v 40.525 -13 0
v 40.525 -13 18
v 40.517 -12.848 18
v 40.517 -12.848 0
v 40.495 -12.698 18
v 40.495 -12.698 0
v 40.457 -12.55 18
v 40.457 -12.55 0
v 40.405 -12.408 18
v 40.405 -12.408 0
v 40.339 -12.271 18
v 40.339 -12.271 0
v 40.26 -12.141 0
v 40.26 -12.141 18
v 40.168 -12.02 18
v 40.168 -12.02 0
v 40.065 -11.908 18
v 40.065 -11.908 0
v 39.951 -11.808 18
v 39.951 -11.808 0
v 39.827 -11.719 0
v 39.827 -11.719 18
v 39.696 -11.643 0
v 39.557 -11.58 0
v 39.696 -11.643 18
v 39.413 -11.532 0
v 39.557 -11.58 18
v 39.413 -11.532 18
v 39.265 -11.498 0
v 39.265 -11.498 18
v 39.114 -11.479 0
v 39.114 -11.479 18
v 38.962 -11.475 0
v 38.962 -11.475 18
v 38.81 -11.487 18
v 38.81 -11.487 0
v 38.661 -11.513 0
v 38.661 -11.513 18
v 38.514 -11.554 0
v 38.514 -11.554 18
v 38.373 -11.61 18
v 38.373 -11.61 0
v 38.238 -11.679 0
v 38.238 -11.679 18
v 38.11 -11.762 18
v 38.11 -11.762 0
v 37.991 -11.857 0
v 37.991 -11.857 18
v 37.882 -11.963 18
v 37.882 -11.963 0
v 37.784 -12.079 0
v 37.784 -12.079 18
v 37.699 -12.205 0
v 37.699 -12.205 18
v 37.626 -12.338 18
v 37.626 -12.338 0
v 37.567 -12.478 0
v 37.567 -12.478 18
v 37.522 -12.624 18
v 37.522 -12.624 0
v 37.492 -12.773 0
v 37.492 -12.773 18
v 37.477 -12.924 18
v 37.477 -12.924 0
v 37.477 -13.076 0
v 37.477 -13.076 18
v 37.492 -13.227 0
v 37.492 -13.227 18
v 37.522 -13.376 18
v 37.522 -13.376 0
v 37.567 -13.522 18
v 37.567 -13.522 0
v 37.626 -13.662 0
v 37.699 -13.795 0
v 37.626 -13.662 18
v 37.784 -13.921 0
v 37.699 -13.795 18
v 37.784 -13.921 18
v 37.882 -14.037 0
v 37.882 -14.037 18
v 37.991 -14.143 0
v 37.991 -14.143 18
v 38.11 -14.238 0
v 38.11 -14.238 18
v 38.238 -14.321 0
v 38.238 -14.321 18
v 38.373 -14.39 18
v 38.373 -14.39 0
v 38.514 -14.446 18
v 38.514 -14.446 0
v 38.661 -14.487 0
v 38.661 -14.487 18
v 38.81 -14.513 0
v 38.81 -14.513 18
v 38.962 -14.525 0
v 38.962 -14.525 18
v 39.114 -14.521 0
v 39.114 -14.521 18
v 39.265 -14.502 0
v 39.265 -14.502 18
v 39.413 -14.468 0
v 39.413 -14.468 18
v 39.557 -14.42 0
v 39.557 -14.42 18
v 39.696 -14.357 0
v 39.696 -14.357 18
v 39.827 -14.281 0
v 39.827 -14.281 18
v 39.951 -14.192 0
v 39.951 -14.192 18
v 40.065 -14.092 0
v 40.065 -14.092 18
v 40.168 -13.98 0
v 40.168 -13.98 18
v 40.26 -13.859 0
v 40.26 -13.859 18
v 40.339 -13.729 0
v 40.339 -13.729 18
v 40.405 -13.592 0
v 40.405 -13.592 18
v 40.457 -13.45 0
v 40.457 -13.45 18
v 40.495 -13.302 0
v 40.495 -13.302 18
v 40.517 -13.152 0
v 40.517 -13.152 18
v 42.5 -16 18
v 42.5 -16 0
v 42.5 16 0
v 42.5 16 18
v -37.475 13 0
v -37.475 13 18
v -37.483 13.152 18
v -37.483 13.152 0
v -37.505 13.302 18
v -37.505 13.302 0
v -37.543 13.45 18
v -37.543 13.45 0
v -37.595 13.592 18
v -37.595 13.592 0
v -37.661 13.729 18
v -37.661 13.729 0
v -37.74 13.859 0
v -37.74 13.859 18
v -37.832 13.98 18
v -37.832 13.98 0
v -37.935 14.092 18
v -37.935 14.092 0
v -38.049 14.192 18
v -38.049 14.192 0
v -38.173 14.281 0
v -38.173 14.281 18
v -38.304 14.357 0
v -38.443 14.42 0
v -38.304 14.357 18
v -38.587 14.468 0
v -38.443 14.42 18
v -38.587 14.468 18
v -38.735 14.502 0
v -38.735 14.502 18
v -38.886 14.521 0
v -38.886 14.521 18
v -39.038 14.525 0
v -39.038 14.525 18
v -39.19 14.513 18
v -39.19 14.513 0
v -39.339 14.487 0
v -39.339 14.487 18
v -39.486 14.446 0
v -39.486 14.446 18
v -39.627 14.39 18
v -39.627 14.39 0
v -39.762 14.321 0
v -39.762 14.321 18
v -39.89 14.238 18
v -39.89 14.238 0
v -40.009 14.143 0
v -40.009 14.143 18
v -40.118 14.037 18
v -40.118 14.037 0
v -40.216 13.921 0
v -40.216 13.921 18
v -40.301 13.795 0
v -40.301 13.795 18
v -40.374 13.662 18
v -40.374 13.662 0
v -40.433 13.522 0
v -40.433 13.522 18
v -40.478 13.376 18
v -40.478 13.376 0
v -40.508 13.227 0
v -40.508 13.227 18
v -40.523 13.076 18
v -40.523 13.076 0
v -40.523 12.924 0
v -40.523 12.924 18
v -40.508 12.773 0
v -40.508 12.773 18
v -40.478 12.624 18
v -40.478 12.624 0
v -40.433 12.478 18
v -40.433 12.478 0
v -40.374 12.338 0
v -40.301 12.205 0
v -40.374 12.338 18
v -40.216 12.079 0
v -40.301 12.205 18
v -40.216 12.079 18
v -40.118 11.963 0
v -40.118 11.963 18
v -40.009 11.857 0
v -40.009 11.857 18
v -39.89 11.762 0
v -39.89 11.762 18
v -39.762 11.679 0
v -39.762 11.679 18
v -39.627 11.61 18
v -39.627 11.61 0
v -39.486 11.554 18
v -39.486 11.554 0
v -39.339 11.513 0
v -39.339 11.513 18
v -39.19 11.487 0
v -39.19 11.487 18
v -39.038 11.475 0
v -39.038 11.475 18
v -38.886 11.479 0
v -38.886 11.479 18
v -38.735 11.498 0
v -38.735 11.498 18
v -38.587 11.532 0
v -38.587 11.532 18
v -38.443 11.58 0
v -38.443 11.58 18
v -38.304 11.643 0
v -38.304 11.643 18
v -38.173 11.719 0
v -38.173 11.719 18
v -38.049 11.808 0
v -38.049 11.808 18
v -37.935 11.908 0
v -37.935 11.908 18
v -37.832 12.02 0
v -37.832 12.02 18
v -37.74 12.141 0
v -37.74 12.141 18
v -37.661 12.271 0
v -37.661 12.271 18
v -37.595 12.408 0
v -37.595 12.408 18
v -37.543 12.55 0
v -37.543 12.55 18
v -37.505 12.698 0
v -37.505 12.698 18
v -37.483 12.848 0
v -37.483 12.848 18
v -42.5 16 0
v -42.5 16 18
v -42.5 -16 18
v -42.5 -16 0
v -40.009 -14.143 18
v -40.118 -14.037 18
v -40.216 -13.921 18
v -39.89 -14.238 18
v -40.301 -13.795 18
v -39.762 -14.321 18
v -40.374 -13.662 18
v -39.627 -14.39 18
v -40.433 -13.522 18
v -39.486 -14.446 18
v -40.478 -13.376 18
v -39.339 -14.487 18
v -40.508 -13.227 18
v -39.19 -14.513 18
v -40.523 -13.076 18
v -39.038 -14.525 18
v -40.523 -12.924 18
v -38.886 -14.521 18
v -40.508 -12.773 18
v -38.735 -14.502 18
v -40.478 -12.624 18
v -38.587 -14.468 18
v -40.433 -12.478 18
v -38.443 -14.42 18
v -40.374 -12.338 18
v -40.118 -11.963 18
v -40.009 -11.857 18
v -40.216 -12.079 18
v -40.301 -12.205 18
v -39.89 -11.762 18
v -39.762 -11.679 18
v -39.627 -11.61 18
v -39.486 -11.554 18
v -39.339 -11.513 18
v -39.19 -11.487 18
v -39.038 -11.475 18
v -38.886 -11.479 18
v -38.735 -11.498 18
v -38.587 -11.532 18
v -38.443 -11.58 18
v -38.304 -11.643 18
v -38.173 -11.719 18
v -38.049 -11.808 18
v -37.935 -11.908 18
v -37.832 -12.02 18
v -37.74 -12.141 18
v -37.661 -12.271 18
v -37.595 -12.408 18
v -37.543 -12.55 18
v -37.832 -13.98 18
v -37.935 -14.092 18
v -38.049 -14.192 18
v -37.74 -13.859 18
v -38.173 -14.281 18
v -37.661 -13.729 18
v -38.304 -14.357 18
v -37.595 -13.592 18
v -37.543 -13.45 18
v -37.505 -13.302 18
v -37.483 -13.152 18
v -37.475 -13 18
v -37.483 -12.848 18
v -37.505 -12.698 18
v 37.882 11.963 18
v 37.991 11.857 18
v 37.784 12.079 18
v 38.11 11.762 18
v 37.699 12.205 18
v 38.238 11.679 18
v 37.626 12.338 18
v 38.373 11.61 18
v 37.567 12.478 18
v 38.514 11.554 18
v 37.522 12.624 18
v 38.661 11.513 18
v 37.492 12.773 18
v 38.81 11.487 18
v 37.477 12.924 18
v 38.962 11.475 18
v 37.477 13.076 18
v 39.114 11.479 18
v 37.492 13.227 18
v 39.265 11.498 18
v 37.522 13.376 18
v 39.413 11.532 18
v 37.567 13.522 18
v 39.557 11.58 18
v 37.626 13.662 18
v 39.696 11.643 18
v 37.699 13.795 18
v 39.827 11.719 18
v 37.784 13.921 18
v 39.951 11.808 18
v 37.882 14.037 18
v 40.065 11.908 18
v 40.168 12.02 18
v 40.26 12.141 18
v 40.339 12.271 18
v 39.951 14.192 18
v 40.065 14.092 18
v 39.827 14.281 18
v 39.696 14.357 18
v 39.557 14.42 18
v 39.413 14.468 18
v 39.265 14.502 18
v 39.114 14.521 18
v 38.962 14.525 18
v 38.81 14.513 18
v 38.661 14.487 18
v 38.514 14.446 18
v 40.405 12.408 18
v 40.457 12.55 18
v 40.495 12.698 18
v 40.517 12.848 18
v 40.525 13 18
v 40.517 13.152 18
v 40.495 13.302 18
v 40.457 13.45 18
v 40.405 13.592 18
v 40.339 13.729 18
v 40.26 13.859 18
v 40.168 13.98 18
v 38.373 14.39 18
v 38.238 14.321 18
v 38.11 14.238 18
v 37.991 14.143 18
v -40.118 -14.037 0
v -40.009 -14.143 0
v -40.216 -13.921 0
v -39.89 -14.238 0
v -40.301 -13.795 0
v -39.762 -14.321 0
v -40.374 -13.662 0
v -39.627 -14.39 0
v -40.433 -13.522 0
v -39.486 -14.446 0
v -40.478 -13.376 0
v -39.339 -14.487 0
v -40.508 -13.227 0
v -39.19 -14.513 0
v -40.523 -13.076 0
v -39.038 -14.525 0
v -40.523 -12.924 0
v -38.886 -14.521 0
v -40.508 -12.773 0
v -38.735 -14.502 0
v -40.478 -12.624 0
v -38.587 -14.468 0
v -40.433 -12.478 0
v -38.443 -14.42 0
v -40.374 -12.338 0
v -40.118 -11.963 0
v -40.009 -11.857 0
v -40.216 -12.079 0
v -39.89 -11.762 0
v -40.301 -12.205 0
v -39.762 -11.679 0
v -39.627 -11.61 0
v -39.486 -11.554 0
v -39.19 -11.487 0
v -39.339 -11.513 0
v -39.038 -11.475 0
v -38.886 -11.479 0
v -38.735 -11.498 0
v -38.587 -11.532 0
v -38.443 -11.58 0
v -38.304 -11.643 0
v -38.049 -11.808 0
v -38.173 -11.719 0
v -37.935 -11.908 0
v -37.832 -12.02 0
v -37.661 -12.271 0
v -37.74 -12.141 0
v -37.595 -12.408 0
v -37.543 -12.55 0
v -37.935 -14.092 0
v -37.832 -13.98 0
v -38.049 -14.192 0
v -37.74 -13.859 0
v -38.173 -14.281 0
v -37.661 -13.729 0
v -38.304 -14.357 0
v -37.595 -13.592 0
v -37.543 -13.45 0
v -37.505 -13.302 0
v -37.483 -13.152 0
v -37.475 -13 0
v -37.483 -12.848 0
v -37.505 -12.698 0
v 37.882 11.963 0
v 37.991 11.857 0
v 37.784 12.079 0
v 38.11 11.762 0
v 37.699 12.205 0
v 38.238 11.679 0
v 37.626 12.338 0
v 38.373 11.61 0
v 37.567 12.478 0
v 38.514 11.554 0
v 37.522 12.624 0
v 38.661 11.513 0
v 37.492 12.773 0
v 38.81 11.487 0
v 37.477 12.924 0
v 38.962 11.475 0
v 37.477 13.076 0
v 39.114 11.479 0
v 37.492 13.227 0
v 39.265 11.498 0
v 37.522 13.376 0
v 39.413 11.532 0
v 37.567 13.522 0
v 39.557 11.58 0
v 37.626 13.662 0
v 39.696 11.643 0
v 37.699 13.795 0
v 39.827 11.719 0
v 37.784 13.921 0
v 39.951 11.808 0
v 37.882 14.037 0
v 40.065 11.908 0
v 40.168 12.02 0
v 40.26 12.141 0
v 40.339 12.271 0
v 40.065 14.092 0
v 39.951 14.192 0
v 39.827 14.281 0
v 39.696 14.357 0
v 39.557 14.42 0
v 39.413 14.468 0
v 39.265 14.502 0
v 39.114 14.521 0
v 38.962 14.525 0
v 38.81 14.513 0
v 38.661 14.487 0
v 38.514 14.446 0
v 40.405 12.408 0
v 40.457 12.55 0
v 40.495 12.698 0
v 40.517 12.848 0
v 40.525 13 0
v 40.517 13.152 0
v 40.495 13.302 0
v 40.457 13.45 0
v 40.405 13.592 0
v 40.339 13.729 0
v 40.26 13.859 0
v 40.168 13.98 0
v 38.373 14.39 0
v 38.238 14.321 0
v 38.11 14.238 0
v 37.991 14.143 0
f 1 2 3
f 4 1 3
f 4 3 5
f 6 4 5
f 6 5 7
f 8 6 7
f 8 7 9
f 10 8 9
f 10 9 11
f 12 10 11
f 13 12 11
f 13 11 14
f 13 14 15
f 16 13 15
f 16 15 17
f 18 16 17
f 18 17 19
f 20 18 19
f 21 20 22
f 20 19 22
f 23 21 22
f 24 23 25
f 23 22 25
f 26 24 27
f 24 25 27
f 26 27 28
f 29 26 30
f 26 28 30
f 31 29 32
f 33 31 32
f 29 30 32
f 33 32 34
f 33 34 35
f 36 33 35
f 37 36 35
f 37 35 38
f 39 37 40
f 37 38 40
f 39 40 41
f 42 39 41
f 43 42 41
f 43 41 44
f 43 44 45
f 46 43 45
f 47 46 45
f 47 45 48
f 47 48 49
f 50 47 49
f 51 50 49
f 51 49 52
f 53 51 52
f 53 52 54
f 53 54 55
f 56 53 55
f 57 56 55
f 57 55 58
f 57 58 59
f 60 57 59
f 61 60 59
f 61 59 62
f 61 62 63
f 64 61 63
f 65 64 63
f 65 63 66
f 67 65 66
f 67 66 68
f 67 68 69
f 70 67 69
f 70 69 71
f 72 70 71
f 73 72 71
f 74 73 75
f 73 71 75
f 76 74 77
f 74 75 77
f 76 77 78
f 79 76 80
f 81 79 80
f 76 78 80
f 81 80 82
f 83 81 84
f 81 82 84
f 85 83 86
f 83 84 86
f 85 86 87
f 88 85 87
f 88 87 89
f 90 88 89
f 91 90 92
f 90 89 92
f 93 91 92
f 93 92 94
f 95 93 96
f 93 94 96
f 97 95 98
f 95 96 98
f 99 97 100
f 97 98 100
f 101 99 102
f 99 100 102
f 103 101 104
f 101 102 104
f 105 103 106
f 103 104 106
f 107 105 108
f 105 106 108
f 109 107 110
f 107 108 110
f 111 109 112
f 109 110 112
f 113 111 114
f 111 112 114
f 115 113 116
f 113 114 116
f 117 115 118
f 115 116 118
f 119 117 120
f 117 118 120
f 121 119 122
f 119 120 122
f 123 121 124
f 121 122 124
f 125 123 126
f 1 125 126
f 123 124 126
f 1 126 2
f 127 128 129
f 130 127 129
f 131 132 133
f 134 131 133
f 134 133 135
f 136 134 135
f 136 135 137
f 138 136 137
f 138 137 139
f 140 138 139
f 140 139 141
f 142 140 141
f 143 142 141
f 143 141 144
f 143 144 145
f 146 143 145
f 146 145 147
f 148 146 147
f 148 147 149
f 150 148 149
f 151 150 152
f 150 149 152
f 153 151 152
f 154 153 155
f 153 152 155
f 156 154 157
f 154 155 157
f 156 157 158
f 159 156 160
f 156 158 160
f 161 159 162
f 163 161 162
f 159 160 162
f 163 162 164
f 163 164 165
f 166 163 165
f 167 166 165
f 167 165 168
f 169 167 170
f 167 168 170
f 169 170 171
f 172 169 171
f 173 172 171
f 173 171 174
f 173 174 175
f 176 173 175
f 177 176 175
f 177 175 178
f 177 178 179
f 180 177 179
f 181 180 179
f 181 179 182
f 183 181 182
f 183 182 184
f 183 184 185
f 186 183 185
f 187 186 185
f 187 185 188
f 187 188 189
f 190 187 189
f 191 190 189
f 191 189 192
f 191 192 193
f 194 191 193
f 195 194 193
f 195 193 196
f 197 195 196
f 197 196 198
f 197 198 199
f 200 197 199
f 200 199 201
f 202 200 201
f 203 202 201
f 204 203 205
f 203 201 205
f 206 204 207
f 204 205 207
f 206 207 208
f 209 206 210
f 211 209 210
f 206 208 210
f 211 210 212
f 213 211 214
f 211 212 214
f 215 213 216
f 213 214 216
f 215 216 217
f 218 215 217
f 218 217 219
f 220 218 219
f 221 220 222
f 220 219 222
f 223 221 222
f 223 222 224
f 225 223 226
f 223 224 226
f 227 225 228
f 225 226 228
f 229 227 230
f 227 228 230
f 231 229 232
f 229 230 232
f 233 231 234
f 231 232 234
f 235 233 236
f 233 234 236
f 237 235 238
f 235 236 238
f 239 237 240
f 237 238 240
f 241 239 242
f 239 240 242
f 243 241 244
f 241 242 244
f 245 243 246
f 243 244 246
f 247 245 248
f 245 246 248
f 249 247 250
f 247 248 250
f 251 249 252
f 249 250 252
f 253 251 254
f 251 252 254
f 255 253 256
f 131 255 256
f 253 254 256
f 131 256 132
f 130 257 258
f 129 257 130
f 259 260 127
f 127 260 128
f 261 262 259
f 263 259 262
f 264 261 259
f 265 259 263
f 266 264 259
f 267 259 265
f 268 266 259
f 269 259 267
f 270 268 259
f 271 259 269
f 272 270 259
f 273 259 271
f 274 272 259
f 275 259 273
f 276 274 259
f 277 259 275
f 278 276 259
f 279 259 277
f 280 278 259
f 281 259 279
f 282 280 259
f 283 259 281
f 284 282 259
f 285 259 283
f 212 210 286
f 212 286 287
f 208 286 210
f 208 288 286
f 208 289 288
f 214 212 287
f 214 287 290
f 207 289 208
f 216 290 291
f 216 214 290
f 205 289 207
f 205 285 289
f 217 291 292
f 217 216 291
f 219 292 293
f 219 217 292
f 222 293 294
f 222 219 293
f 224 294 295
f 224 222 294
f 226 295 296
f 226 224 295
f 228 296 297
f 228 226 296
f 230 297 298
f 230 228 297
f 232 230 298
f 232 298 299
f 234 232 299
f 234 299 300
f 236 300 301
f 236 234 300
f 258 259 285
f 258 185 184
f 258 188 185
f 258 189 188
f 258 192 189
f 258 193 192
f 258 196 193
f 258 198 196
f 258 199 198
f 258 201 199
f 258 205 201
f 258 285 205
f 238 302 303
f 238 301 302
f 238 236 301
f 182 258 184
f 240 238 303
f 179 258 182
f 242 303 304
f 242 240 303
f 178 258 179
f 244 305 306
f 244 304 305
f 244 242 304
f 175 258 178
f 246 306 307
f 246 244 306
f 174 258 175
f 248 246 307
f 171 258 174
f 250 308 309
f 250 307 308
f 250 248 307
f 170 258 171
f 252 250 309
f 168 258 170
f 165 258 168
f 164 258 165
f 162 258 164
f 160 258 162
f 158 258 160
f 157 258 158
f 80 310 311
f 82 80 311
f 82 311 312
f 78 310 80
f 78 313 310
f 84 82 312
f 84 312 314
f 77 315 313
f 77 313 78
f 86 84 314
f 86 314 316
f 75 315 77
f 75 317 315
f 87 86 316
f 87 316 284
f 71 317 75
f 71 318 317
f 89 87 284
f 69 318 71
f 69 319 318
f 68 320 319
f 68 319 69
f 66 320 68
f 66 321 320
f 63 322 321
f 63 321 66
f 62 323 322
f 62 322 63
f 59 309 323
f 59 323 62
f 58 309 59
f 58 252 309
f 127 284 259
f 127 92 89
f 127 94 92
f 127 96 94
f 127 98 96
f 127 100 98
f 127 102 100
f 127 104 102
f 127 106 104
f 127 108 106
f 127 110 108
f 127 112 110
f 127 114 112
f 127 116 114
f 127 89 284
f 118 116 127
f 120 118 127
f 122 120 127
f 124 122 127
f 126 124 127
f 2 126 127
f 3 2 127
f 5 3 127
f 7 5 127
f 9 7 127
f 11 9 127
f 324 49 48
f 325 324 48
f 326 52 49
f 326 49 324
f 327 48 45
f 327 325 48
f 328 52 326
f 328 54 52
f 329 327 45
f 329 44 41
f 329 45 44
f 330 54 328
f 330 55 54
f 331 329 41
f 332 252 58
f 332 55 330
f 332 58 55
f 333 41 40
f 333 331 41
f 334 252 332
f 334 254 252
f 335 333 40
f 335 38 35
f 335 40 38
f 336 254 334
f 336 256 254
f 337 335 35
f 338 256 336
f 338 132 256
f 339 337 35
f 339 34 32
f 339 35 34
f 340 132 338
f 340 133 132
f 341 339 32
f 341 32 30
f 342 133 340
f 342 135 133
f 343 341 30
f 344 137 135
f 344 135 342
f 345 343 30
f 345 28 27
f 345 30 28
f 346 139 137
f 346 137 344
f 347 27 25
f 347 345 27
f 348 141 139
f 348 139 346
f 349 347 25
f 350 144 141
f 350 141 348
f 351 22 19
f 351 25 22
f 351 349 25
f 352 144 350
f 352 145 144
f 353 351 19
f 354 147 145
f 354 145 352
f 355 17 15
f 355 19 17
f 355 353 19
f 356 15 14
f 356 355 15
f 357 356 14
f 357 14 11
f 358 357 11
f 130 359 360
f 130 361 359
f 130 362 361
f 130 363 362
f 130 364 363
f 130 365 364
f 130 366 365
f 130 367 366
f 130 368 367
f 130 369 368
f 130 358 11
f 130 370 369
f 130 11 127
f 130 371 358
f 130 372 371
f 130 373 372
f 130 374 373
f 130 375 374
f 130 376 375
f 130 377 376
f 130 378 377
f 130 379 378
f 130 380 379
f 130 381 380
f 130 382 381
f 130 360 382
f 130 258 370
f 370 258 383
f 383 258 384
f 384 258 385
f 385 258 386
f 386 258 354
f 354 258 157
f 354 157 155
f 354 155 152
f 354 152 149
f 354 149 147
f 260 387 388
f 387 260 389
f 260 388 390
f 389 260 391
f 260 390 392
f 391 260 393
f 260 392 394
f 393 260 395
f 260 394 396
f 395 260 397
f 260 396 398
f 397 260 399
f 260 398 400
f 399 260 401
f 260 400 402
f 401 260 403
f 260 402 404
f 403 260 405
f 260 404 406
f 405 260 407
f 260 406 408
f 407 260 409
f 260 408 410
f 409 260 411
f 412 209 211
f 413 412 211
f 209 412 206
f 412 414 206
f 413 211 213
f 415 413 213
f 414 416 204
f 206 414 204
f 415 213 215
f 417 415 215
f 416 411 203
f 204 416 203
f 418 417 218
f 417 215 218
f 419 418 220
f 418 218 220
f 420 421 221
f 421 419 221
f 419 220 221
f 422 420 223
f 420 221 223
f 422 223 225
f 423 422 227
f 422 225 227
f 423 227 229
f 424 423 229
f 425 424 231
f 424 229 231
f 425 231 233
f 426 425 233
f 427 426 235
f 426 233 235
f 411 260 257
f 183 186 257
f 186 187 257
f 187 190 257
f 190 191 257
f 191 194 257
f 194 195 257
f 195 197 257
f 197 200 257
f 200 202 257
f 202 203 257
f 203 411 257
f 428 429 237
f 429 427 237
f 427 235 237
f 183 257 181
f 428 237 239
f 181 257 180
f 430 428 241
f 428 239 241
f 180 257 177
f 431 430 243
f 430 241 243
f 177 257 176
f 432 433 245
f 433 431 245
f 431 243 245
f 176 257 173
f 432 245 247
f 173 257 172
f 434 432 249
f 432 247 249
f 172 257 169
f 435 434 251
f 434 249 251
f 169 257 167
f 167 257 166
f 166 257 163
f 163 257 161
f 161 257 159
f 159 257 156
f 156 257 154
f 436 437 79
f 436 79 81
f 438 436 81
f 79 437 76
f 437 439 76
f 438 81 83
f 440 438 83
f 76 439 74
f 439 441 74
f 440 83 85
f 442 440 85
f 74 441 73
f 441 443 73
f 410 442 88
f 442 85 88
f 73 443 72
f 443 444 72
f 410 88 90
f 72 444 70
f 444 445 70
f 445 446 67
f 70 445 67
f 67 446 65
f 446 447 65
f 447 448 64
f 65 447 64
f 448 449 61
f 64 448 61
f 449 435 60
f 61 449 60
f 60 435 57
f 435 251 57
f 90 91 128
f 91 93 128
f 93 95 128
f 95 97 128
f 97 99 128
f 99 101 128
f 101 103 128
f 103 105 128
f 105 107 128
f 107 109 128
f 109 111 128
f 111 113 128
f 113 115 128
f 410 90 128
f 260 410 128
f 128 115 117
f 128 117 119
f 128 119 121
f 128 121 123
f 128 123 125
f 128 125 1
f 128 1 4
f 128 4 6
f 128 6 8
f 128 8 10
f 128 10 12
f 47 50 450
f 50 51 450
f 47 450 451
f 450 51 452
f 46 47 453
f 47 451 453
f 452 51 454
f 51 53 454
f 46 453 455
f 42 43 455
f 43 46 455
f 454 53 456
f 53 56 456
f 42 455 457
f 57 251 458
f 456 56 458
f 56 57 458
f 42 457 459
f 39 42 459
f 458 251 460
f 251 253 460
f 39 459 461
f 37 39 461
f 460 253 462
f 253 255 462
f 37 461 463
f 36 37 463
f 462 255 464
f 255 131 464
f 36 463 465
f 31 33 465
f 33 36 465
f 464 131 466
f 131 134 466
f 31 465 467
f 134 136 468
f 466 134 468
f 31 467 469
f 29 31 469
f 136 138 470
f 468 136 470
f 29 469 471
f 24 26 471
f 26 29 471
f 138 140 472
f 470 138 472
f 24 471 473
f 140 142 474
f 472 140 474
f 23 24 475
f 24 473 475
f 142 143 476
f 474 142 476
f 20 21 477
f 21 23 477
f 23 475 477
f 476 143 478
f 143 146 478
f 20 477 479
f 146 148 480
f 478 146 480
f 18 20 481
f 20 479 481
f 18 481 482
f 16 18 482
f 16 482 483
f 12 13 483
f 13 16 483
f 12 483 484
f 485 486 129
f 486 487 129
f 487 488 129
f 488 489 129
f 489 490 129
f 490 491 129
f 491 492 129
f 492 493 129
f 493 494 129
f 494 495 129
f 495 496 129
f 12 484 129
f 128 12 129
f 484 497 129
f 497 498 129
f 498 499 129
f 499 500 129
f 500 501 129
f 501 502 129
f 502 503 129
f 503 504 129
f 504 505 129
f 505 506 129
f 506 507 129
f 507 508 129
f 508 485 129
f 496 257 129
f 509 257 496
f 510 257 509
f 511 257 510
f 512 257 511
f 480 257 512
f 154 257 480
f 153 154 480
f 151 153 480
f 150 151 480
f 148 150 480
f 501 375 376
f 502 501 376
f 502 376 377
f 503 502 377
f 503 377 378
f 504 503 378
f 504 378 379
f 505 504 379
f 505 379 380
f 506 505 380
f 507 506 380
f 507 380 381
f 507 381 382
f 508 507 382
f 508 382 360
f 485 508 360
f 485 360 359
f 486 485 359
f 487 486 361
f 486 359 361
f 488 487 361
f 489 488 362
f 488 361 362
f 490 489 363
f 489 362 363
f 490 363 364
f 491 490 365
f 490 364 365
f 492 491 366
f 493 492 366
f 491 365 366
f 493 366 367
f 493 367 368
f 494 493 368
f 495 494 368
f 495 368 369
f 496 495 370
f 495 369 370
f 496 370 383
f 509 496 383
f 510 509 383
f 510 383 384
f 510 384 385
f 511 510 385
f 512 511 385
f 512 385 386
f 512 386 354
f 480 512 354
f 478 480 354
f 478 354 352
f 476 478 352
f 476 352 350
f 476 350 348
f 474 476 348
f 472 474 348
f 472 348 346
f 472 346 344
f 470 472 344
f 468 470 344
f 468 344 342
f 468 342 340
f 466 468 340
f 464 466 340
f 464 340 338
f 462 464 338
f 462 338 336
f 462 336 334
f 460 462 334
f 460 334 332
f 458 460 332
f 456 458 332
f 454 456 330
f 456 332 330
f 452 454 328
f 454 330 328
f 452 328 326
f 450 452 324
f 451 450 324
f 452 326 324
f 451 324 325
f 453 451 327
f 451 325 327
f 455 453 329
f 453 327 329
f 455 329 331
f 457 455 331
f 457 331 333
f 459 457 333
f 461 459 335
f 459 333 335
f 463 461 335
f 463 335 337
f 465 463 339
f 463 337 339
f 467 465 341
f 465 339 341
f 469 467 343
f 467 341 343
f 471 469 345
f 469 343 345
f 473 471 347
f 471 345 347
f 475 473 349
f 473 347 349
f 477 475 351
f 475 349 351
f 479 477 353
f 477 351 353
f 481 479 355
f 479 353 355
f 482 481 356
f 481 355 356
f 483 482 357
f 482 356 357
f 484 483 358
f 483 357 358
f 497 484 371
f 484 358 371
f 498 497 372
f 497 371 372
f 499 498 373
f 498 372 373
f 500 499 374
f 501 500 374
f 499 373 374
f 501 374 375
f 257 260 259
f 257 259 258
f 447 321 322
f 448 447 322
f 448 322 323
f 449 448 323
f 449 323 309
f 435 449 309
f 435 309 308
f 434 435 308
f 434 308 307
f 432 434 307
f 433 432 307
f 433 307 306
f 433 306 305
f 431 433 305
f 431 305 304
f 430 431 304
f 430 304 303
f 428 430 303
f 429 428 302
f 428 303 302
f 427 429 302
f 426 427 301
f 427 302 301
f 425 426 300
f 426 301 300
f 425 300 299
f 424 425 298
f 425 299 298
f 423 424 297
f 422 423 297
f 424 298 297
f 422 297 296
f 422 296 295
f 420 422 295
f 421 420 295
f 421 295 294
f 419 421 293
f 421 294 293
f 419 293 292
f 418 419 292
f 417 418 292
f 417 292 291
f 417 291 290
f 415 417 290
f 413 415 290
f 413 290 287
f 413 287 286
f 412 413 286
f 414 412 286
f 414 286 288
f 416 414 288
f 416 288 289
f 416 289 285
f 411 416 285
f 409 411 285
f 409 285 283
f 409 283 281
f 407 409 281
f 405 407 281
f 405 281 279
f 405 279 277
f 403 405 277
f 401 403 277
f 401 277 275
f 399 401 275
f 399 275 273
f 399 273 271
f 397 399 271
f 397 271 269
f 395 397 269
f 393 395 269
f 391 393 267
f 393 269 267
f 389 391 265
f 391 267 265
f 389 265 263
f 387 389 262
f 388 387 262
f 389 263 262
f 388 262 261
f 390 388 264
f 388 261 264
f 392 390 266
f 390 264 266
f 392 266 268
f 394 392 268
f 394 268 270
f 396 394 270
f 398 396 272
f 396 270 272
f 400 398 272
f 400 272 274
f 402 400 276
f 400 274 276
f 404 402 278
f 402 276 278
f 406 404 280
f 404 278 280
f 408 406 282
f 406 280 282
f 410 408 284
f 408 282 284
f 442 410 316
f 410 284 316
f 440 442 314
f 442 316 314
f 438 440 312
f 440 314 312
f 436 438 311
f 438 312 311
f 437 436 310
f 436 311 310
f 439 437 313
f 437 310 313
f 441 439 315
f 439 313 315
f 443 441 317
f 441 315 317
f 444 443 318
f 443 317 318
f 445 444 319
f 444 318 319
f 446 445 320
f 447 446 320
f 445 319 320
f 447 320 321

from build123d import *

# Parameters (mm, degrees)
SKETCH_1_W               = 85
SKETCH_1_H               = 32
EXTRUDE_1_DEPTH          = 18
SKETCH_2_R               = 1.525
CUT_EXTRUDE_1_DEPTH      = 1
CUT_EXTRUDE_1_DEPTH_BACK = 19


with BuildPart() as part:
    # 草图1 → 凸台-拉伸1 (new body)
    with BuildSketch(Plane.XY):
        Rectangle(SKETCH_1_W, SKETCH_1_H)
    extrude(amount=EXTRUDE_1_DEPTH)

    # 草图2 → 切除-拉伸1 (cut, two sides)
    with BuildSketch(Plane.XY.offset(18)) as cut_extrude_1_sk:
        with Locations((39, 13)):
            Circle(SKETCH_2_R)
        with Locations((39, -13)):
            Circle(SKETCH_2_R)
        with Locations((-39, -13)):
            Circle(SKETCH_2_R)
        with Locations((-39, 13)):
            Circle(SKETCH_2_R)
    extrude(amount=CUT_EXTRUDE_1_DEPTH, mode=Mode.SUBTRACT)
    extrude(cut_extrude_1_sk.sketch, amount=-CUT_EXTRUDE_1_DEPTH_BACK, mode=Mode.SUBTRACT)


solid = part.part
